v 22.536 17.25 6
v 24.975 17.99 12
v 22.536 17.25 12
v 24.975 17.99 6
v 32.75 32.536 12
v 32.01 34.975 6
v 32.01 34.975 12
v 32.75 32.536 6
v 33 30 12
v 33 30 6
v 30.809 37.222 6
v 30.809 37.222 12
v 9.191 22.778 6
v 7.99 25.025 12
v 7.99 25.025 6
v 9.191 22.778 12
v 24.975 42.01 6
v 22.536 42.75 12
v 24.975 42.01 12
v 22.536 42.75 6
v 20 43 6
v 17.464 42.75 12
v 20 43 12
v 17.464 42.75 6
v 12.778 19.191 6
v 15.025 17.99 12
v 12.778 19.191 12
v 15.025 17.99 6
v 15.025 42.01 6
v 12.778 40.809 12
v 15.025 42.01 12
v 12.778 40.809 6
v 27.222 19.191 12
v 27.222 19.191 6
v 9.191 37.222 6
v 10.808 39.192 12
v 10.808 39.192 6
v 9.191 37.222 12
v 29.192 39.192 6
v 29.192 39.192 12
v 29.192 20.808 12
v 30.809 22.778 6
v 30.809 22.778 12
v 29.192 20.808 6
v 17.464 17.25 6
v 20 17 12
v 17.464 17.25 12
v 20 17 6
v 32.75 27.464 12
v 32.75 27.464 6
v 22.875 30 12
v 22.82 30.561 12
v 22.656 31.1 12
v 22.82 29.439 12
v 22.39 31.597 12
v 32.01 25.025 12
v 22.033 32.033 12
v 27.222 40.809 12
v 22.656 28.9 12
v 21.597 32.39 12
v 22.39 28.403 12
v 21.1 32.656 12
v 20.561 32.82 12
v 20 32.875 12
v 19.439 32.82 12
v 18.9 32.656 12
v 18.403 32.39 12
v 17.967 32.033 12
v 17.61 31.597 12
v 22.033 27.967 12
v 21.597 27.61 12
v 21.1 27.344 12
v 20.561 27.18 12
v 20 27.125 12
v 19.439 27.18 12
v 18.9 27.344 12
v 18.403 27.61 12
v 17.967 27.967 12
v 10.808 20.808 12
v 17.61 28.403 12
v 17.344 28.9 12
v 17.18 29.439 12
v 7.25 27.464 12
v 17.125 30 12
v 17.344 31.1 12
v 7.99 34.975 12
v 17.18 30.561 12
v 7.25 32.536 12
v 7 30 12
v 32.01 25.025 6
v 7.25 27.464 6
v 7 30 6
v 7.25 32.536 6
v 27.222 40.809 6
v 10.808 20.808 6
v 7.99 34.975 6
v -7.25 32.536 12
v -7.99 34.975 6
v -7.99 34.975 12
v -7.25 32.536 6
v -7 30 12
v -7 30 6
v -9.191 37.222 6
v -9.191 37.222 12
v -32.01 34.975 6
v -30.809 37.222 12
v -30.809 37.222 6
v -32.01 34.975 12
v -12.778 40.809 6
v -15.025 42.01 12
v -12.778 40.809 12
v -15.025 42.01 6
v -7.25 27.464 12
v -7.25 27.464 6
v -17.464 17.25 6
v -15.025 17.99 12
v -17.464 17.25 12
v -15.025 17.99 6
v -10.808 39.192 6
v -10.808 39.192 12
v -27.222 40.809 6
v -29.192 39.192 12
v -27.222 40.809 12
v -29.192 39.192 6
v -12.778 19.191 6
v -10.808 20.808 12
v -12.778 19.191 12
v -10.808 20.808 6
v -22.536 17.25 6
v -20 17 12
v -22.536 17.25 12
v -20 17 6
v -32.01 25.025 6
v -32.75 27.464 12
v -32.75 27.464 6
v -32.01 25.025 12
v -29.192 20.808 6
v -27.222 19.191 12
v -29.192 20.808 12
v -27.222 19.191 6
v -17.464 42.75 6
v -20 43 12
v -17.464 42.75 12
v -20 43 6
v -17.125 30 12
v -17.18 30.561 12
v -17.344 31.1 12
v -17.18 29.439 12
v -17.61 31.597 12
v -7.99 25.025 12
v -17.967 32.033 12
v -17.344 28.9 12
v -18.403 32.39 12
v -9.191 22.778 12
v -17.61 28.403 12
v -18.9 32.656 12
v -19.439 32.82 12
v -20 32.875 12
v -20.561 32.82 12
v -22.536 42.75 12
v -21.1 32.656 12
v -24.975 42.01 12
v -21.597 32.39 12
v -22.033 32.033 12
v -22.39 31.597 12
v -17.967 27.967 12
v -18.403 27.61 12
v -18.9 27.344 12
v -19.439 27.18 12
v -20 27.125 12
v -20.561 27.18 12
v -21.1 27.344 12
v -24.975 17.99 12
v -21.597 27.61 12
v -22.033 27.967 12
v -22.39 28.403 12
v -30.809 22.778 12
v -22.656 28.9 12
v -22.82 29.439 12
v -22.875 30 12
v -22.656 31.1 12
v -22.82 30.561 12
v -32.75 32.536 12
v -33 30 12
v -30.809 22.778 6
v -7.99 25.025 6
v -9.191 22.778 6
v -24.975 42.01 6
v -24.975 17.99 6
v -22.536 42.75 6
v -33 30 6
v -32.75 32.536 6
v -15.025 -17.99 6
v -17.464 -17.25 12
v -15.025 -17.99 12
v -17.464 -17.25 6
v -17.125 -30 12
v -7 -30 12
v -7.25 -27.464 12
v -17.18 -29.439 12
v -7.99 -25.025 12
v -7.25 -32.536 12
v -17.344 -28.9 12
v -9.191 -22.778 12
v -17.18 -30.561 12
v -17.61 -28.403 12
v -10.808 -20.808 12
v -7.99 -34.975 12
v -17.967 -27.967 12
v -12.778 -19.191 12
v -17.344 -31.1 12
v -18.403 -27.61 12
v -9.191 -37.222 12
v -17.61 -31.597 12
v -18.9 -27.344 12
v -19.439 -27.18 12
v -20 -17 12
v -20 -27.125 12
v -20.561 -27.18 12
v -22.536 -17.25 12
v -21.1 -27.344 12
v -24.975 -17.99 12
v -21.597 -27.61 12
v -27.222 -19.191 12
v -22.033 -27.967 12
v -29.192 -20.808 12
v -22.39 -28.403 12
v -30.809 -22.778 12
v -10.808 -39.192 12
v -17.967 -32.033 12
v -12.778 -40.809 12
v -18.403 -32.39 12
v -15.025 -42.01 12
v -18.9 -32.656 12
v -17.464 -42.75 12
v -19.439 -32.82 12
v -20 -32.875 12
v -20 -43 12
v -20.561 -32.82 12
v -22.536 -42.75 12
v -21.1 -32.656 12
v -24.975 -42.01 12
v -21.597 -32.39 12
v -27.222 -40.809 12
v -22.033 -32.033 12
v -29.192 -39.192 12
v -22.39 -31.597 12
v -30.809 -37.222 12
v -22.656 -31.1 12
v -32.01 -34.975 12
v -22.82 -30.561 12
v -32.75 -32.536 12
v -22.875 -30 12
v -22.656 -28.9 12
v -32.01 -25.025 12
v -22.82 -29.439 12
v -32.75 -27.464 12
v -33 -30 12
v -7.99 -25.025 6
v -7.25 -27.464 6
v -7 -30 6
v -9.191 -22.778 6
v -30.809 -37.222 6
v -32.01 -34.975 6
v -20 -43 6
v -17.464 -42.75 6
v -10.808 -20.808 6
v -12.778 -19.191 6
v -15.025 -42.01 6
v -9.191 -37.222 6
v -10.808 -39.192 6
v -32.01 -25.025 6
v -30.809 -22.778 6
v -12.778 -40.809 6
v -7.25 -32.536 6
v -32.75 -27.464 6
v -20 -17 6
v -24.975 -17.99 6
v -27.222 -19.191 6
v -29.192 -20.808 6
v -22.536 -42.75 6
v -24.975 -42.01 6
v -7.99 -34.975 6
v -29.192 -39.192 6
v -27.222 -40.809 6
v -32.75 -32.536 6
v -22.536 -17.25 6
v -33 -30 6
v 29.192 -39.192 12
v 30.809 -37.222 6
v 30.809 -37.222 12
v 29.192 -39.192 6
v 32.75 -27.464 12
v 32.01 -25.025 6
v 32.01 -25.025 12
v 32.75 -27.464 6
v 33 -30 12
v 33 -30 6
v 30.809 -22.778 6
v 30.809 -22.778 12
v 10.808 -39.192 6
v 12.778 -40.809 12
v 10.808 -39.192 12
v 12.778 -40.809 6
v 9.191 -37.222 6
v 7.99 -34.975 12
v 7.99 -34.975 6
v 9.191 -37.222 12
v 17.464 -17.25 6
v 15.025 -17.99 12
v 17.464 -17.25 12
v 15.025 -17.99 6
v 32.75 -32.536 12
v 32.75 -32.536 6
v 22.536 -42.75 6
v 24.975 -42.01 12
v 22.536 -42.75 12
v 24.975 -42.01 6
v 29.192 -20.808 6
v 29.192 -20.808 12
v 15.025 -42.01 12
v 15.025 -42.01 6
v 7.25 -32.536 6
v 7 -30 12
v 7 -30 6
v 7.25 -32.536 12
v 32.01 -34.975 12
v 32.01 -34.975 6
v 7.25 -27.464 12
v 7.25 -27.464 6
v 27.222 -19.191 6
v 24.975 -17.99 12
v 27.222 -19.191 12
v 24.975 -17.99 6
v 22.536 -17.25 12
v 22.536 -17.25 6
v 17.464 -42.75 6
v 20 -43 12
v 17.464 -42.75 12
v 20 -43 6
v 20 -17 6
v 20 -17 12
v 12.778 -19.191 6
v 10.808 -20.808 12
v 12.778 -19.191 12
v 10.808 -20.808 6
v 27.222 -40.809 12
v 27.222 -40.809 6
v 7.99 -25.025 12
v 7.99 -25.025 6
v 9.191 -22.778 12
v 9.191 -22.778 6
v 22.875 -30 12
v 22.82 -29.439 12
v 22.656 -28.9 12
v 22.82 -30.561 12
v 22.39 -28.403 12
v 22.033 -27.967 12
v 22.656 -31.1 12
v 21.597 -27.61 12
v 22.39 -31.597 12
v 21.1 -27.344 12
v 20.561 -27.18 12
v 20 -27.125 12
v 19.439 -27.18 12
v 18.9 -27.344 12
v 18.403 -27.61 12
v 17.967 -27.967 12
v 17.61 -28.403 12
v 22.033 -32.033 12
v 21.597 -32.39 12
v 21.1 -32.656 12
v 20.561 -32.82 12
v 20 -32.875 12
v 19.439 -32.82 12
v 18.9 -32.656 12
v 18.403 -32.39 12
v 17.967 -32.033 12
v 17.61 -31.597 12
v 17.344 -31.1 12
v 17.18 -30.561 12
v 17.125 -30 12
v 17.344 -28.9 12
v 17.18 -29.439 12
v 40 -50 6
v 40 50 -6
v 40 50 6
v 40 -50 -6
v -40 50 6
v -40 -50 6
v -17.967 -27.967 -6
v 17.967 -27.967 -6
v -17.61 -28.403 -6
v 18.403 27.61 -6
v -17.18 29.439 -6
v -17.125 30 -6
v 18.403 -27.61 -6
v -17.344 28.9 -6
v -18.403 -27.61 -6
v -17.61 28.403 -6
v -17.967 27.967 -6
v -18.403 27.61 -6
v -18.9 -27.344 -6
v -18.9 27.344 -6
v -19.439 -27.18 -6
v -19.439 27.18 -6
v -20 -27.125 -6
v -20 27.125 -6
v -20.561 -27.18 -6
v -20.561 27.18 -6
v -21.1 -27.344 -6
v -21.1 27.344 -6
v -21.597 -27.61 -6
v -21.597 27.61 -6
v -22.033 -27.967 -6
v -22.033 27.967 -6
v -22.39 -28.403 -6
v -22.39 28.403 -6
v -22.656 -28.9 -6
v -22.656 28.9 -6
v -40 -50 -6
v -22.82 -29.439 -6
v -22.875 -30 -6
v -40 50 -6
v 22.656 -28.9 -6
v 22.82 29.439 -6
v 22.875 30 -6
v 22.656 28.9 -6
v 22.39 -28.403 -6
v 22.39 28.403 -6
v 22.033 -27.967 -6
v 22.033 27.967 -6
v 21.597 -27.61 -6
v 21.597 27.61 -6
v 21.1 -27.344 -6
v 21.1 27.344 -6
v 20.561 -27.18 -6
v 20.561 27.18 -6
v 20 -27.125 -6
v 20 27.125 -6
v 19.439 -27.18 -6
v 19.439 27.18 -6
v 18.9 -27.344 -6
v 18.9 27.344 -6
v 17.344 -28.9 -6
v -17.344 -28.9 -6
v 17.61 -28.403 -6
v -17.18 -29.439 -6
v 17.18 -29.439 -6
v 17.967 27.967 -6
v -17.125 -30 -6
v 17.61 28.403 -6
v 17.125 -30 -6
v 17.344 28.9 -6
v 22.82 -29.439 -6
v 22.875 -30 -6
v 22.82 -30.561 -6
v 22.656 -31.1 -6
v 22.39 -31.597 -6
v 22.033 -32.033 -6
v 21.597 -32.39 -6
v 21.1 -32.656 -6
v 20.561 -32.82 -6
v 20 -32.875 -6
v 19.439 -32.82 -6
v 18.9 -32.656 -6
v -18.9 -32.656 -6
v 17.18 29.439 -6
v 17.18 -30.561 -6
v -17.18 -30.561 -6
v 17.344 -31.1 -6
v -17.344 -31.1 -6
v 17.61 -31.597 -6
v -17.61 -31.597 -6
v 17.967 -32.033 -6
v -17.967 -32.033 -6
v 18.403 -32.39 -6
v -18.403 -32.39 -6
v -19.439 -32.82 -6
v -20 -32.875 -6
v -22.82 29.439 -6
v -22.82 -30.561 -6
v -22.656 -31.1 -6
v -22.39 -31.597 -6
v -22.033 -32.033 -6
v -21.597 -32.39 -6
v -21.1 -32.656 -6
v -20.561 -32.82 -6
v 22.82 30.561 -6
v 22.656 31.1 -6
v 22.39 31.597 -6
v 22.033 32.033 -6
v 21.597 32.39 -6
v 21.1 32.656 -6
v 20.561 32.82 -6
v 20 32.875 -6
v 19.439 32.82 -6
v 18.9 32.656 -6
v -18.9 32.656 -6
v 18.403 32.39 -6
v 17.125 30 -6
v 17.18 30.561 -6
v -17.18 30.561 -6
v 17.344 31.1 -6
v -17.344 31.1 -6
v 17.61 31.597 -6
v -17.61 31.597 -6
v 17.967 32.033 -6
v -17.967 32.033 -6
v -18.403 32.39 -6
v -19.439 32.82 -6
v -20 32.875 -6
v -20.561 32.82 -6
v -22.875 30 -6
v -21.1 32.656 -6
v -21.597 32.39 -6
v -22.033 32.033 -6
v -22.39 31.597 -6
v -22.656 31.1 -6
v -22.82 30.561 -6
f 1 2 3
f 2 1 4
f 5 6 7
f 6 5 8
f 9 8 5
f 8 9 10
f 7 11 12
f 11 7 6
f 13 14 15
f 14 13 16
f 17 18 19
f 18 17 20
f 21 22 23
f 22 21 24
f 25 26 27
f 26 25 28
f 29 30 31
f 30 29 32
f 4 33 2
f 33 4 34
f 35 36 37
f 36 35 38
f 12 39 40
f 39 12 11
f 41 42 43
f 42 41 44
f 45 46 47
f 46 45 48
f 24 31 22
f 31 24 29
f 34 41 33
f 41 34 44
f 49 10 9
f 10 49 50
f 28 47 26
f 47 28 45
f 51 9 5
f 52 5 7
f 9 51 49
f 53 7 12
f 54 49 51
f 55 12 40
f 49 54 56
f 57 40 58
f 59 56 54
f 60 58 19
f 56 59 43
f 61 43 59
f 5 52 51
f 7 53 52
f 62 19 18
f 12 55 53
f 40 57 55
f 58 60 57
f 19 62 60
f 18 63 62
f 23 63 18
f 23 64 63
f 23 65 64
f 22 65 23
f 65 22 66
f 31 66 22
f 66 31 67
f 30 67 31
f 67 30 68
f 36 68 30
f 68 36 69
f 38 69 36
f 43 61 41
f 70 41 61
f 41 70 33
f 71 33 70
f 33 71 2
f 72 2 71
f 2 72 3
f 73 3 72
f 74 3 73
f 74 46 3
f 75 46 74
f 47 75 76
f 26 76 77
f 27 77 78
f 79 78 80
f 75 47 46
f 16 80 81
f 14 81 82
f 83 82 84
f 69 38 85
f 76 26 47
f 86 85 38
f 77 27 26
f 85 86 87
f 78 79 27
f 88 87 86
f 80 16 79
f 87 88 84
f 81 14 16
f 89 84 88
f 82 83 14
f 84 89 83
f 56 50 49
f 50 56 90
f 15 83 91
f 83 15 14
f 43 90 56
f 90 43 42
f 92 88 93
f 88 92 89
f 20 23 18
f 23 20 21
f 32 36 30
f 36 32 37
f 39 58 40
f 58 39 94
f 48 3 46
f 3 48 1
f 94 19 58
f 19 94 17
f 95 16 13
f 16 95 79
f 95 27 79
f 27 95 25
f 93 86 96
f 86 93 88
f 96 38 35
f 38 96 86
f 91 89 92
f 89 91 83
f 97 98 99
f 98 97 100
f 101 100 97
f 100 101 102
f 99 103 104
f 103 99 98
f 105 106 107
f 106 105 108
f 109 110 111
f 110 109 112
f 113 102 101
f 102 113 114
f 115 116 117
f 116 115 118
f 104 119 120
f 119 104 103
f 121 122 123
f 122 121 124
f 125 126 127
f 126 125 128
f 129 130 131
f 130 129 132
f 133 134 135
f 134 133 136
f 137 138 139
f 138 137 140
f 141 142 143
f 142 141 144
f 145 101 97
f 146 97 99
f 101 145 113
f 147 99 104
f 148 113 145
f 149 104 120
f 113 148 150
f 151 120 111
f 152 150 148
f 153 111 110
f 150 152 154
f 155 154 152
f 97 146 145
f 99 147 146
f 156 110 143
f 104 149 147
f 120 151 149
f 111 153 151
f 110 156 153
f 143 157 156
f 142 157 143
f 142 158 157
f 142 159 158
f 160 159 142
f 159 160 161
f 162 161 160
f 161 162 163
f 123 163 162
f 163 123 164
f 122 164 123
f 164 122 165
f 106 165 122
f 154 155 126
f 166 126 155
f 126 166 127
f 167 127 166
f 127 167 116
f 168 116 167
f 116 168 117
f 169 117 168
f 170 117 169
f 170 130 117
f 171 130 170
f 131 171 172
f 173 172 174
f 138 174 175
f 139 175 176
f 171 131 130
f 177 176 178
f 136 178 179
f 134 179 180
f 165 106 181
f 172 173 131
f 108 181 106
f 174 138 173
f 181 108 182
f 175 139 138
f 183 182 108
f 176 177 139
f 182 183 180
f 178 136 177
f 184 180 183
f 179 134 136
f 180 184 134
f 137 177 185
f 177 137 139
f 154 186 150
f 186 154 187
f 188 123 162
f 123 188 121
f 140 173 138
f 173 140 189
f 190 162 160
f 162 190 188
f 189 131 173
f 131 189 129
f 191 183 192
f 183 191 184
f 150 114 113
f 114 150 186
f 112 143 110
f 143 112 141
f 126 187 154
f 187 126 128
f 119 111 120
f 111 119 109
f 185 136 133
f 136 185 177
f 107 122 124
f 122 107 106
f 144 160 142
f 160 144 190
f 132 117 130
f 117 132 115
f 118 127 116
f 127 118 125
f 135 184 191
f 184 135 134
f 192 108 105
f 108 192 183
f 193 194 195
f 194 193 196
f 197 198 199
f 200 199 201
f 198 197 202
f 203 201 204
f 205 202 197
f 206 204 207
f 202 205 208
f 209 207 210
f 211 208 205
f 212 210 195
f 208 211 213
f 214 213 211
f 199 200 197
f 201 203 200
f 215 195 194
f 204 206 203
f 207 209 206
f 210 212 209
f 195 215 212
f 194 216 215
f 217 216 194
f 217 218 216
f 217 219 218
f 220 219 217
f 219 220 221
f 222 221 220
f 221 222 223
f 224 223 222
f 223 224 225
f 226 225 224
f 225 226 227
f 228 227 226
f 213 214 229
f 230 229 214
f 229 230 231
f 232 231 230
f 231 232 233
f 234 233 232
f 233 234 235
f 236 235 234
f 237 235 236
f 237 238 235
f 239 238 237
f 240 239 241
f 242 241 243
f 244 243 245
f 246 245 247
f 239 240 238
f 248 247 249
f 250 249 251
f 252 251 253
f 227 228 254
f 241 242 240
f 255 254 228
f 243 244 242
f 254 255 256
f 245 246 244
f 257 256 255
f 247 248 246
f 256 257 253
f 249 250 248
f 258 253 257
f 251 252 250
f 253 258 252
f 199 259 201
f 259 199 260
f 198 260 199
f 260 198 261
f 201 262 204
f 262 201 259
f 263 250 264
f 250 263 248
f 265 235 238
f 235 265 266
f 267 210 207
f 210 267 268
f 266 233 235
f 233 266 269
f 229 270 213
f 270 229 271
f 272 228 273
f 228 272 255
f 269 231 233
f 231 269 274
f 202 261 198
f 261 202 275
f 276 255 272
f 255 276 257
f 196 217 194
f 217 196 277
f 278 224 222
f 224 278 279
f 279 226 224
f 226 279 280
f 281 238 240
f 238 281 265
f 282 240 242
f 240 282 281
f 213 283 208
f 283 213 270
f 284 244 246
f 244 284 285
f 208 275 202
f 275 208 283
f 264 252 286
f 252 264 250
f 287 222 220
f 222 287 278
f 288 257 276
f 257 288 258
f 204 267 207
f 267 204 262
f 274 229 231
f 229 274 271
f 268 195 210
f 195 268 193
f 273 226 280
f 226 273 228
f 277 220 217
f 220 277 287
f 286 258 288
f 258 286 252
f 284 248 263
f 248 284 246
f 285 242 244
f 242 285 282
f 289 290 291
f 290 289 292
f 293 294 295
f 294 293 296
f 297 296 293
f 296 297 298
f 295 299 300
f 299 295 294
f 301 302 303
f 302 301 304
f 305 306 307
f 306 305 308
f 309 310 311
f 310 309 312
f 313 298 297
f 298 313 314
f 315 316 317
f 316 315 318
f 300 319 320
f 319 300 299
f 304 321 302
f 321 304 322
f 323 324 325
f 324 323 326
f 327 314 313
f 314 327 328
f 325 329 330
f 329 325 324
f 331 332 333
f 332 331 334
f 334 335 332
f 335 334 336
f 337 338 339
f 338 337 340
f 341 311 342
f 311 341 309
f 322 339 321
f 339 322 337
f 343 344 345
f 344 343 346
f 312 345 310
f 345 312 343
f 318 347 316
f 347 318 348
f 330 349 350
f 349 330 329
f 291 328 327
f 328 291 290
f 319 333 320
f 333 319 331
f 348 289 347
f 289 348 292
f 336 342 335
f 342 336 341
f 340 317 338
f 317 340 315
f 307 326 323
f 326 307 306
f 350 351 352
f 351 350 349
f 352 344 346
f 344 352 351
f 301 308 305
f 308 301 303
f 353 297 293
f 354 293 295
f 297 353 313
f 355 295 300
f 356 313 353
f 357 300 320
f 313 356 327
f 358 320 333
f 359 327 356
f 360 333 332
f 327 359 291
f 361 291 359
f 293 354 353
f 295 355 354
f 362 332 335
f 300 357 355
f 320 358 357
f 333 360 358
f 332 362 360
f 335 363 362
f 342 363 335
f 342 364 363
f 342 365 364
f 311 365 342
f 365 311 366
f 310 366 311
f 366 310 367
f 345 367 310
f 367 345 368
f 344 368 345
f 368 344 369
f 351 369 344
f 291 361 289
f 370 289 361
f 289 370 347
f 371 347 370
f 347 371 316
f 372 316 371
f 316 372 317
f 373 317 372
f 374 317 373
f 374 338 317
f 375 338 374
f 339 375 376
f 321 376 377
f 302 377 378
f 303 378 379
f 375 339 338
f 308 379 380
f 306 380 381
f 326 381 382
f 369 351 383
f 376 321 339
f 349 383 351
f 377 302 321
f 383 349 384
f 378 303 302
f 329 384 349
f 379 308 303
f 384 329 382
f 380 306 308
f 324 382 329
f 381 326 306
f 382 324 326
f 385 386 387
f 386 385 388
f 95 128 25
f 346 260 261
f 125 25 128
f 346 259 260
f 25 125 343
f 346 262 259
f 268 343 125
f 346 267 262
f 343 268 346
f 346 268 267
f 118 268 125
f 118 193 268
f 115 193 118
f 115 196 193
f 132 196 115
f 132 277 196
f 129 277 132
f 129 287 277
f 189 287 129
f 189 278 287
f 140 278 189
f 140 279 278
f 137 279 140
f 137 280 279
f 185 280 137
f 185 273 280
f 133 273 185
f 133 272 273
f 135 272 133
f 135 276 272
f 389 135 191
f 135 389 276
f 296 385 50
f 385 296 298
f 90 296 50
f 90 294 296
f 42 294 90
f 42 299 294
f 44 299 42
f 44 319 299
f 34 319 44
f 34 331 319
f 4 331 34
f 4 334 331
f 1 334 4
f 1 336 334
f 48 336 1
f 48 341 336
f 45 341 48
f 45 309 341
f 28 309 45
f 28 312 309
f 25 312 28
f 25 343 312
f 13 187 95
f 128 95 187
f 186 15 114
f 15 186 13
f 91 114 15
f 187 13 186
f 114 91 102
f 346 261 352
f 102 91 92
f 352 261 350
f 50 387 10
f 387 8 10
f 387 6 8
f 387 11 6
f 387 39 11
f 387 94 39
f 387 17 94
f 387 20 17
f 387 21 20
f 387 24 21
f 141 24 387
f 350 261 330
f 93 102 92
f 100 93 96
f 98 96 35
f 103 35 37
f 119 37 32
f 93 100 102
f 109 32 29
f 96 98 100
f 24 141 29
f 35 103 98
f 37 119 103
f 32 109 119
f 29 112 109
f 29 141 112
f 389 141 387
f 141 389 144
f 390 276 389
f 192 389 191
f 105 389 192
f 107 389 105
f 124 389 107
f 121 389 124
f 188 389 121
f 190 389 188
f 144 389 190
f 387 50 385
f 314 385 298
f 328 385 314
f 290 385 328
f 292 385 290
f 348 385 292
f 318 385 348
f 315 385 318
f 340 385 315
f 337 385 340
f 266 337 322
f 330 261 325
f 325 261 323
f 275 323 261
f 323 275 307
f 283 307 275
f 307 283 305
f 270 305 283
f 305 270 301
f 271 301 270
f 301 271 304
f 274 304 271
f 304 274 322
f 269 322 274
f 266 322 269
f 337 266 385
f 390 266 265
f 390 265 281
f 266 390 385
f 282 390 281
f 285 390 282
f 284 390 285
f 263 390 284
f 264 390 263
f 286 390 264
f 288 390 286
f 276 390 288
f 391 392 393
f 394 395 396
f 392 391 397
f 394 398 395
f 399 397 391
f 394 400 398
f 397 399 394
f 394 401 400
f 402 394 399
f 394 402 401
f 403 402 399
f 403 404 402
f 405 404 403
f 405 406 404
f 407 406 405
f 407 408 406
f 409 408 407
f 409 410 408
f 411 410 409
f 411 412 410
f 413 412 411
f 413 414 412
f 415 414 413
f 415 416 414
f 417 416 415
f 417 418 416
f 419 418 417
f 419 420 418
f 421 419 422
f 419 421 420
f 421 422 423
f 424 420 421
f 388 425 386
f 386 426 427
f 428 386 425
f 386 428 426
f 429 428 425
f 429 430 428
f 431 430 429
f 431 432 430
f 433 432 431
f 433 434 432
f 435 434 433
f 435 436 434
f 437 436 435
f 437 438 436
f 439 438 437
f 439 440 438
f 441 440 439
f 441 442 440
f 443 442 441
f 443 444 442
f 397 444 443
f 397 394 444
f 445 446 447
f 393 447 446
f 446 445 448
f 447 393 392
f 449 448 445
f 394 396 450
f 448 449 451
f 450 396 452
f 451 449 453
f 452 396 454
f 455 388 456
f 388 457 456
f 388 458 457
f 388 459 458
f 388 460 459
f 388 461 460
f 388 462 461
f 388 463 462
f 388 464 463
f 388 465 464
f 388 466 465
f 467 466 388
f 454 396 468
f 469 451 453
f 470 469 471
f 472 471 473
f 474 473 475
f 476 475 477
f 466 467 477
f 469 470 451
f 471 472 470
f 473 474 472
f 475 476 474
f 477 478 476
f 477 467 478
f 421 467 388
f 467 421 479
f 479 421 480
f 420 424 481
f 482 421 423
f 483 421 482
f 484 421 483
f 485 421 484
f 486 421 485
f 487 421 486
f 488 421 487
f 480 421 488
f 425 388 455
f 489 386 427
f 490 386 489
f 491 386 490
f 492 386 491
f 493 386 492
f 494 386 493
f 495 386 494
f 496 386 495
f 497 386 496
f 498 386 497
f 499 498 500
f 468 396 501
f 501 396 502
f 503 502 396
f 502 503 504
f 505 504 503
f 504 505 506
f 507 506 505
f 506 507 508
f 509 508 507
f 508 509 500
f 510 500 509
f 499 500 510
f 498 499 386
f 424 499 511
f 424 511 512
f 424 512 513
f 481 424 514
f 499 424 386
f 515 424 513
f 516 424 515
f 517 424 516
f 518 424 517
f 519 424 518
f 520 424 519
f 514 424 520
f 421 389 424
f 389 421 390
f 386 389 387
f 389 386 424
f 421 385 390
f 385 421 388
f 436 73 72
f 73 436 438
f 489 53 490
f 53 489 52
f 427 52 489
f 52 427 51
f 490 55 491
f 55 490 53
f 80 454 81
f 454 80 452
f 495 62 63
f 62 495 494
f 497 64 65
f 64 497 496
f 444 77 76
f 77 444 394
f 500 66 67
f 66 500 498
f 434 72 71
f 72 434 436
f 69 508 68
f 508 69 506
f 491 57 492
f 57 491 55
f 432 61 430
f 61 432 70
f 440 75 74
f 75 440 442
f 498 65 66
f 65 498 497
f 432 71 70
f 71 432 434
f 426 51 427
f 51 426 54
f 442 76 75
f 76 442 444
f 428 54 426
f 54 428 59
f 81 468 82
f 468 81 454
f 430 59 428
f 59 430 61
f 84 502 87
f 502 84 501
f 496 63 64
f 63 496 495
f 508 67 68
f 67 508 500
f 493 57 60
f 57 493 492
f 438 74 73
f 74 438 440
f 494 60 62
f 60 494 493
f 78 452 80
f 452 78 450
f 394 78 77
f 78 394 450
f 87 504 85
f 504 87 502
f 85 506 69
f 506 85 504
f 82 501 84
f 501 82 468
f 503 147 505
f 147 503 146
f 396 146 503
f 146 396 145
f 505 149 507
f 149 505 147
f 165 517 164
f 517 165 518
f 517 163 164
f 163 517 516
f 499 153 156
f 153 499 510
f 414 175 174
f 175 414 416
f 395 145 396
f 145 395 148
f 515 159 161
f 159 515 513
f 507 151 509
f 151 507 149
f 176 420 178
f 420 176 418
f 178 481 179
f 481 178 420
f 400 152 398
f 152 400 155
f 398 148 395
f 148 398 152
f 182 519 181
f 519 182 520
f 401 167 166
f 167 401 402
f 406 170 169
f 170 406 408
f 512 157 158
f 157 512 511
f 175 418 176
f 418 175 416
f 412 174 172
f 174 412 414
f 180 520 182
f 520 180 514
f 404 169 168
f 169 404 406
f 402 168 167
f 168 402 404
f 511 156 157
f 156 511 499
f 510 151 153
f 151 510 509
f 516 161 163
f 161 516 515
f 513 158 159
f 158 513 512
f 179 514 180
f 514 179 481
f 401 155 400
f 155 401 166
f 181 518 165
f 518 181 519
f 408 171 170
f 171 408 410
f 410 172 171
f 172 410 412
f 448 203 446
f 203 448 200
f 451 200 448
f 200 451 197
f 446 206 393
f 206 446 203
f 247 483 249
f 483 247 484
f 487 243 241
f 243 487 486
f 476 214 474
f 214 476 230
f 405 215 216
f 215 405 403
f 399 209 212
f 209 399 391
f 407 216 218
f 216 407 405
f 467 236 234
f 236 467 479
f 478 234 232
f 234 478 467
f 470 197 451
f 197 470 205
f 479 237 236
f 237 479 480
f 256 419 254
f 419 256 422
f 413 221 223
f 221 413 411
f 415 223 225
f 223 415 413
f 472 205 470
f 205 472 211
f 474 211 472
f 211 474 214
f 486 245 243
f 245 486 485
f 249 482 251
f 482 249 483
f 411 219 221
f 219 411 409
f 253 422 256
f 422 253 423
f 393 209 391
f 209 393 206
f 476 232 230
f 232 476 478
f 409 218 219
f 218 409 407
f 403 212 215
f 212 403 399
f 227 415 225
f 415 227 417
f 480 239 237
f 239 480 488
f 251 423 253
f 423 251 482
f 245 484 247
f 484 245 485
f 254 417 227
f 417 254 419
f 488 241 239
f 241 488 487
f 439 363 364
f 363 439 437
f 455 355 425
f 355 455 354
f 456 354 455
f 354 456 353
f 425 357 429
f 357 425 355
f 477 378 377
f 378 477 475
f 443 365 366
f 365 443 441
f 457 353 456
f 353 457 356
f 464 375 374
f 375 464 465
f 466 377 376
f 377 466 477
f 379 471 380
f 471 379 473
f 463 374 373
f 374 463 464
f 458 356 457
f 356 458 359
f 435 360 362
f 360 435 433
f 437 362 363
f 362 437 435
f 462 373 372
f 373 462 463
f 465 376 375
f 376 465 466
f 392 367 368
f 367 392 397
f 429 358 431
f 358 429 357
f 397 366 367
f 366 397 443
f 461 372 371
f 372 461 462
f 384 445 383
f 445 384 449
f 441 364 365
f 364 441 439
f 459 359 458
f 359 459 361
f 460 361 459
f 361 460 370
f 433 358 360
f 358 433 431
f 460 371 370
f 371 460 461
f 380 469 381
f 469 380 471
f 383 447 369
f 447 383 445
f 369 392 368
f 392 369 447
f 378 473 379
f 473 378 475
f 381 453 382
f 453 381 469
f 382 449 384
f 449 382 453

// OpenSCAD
$fn = 32;

// ----------------------------------------------------------------------
// Anchor pads 80 x 100 x 18
// four corner bosses with anchor holes
// ----------------------------------------------------------------------

// --- parameters (mm) ---
plate = [80, 100, 12];   // base plate size (x, y, z)
pads = 4;                // boss count, one per corner
edge = 20;               // boss centre offset from the plate edge
boss_d = 26;             // boss diameter
boss_h = 6;              // boss height above the base plate
bore_d = 5.5;            // nominal hole diameter from the drawing
print_allowance = 0.25;  // clearance added for printing

// --- derived feature positions (mm) ---
hole_d = bore_d + print_allowance;  // = 5.75   hole diameter as printed
height = plate[2] + boss_h;         // = 18   overall height of the part
corner_x = plate[0] / 2 - edge;     // = 20   boss centre X
corner_y = plate[1] / 2 - edge;     // = 30   boss centre Y
feature_centers = [
  [corner_x, corner_y],
  [-corner_x, corner_y],
  [-corner_x, -corner_y],
  [corner_x, -corner_y]
];   // boss centres, anchor holes are drilled there

// base plate, four bosses standing on it, anchor holes all the way through
difference() {
  union() {
    cube(plate, center = true);
    for (centre = feature_centers)
      translate([centre[0], centre[1], plate[2] / 2 - 1])
        cylinder(d = boss_d, h = boss_h + 1);
  }
  for (centre = feature_centers)
    translate([centre[0], centre[1], -height])
      cylinder(d = hole_d, h = 2 * height + 2);  // through boss and plate
}
